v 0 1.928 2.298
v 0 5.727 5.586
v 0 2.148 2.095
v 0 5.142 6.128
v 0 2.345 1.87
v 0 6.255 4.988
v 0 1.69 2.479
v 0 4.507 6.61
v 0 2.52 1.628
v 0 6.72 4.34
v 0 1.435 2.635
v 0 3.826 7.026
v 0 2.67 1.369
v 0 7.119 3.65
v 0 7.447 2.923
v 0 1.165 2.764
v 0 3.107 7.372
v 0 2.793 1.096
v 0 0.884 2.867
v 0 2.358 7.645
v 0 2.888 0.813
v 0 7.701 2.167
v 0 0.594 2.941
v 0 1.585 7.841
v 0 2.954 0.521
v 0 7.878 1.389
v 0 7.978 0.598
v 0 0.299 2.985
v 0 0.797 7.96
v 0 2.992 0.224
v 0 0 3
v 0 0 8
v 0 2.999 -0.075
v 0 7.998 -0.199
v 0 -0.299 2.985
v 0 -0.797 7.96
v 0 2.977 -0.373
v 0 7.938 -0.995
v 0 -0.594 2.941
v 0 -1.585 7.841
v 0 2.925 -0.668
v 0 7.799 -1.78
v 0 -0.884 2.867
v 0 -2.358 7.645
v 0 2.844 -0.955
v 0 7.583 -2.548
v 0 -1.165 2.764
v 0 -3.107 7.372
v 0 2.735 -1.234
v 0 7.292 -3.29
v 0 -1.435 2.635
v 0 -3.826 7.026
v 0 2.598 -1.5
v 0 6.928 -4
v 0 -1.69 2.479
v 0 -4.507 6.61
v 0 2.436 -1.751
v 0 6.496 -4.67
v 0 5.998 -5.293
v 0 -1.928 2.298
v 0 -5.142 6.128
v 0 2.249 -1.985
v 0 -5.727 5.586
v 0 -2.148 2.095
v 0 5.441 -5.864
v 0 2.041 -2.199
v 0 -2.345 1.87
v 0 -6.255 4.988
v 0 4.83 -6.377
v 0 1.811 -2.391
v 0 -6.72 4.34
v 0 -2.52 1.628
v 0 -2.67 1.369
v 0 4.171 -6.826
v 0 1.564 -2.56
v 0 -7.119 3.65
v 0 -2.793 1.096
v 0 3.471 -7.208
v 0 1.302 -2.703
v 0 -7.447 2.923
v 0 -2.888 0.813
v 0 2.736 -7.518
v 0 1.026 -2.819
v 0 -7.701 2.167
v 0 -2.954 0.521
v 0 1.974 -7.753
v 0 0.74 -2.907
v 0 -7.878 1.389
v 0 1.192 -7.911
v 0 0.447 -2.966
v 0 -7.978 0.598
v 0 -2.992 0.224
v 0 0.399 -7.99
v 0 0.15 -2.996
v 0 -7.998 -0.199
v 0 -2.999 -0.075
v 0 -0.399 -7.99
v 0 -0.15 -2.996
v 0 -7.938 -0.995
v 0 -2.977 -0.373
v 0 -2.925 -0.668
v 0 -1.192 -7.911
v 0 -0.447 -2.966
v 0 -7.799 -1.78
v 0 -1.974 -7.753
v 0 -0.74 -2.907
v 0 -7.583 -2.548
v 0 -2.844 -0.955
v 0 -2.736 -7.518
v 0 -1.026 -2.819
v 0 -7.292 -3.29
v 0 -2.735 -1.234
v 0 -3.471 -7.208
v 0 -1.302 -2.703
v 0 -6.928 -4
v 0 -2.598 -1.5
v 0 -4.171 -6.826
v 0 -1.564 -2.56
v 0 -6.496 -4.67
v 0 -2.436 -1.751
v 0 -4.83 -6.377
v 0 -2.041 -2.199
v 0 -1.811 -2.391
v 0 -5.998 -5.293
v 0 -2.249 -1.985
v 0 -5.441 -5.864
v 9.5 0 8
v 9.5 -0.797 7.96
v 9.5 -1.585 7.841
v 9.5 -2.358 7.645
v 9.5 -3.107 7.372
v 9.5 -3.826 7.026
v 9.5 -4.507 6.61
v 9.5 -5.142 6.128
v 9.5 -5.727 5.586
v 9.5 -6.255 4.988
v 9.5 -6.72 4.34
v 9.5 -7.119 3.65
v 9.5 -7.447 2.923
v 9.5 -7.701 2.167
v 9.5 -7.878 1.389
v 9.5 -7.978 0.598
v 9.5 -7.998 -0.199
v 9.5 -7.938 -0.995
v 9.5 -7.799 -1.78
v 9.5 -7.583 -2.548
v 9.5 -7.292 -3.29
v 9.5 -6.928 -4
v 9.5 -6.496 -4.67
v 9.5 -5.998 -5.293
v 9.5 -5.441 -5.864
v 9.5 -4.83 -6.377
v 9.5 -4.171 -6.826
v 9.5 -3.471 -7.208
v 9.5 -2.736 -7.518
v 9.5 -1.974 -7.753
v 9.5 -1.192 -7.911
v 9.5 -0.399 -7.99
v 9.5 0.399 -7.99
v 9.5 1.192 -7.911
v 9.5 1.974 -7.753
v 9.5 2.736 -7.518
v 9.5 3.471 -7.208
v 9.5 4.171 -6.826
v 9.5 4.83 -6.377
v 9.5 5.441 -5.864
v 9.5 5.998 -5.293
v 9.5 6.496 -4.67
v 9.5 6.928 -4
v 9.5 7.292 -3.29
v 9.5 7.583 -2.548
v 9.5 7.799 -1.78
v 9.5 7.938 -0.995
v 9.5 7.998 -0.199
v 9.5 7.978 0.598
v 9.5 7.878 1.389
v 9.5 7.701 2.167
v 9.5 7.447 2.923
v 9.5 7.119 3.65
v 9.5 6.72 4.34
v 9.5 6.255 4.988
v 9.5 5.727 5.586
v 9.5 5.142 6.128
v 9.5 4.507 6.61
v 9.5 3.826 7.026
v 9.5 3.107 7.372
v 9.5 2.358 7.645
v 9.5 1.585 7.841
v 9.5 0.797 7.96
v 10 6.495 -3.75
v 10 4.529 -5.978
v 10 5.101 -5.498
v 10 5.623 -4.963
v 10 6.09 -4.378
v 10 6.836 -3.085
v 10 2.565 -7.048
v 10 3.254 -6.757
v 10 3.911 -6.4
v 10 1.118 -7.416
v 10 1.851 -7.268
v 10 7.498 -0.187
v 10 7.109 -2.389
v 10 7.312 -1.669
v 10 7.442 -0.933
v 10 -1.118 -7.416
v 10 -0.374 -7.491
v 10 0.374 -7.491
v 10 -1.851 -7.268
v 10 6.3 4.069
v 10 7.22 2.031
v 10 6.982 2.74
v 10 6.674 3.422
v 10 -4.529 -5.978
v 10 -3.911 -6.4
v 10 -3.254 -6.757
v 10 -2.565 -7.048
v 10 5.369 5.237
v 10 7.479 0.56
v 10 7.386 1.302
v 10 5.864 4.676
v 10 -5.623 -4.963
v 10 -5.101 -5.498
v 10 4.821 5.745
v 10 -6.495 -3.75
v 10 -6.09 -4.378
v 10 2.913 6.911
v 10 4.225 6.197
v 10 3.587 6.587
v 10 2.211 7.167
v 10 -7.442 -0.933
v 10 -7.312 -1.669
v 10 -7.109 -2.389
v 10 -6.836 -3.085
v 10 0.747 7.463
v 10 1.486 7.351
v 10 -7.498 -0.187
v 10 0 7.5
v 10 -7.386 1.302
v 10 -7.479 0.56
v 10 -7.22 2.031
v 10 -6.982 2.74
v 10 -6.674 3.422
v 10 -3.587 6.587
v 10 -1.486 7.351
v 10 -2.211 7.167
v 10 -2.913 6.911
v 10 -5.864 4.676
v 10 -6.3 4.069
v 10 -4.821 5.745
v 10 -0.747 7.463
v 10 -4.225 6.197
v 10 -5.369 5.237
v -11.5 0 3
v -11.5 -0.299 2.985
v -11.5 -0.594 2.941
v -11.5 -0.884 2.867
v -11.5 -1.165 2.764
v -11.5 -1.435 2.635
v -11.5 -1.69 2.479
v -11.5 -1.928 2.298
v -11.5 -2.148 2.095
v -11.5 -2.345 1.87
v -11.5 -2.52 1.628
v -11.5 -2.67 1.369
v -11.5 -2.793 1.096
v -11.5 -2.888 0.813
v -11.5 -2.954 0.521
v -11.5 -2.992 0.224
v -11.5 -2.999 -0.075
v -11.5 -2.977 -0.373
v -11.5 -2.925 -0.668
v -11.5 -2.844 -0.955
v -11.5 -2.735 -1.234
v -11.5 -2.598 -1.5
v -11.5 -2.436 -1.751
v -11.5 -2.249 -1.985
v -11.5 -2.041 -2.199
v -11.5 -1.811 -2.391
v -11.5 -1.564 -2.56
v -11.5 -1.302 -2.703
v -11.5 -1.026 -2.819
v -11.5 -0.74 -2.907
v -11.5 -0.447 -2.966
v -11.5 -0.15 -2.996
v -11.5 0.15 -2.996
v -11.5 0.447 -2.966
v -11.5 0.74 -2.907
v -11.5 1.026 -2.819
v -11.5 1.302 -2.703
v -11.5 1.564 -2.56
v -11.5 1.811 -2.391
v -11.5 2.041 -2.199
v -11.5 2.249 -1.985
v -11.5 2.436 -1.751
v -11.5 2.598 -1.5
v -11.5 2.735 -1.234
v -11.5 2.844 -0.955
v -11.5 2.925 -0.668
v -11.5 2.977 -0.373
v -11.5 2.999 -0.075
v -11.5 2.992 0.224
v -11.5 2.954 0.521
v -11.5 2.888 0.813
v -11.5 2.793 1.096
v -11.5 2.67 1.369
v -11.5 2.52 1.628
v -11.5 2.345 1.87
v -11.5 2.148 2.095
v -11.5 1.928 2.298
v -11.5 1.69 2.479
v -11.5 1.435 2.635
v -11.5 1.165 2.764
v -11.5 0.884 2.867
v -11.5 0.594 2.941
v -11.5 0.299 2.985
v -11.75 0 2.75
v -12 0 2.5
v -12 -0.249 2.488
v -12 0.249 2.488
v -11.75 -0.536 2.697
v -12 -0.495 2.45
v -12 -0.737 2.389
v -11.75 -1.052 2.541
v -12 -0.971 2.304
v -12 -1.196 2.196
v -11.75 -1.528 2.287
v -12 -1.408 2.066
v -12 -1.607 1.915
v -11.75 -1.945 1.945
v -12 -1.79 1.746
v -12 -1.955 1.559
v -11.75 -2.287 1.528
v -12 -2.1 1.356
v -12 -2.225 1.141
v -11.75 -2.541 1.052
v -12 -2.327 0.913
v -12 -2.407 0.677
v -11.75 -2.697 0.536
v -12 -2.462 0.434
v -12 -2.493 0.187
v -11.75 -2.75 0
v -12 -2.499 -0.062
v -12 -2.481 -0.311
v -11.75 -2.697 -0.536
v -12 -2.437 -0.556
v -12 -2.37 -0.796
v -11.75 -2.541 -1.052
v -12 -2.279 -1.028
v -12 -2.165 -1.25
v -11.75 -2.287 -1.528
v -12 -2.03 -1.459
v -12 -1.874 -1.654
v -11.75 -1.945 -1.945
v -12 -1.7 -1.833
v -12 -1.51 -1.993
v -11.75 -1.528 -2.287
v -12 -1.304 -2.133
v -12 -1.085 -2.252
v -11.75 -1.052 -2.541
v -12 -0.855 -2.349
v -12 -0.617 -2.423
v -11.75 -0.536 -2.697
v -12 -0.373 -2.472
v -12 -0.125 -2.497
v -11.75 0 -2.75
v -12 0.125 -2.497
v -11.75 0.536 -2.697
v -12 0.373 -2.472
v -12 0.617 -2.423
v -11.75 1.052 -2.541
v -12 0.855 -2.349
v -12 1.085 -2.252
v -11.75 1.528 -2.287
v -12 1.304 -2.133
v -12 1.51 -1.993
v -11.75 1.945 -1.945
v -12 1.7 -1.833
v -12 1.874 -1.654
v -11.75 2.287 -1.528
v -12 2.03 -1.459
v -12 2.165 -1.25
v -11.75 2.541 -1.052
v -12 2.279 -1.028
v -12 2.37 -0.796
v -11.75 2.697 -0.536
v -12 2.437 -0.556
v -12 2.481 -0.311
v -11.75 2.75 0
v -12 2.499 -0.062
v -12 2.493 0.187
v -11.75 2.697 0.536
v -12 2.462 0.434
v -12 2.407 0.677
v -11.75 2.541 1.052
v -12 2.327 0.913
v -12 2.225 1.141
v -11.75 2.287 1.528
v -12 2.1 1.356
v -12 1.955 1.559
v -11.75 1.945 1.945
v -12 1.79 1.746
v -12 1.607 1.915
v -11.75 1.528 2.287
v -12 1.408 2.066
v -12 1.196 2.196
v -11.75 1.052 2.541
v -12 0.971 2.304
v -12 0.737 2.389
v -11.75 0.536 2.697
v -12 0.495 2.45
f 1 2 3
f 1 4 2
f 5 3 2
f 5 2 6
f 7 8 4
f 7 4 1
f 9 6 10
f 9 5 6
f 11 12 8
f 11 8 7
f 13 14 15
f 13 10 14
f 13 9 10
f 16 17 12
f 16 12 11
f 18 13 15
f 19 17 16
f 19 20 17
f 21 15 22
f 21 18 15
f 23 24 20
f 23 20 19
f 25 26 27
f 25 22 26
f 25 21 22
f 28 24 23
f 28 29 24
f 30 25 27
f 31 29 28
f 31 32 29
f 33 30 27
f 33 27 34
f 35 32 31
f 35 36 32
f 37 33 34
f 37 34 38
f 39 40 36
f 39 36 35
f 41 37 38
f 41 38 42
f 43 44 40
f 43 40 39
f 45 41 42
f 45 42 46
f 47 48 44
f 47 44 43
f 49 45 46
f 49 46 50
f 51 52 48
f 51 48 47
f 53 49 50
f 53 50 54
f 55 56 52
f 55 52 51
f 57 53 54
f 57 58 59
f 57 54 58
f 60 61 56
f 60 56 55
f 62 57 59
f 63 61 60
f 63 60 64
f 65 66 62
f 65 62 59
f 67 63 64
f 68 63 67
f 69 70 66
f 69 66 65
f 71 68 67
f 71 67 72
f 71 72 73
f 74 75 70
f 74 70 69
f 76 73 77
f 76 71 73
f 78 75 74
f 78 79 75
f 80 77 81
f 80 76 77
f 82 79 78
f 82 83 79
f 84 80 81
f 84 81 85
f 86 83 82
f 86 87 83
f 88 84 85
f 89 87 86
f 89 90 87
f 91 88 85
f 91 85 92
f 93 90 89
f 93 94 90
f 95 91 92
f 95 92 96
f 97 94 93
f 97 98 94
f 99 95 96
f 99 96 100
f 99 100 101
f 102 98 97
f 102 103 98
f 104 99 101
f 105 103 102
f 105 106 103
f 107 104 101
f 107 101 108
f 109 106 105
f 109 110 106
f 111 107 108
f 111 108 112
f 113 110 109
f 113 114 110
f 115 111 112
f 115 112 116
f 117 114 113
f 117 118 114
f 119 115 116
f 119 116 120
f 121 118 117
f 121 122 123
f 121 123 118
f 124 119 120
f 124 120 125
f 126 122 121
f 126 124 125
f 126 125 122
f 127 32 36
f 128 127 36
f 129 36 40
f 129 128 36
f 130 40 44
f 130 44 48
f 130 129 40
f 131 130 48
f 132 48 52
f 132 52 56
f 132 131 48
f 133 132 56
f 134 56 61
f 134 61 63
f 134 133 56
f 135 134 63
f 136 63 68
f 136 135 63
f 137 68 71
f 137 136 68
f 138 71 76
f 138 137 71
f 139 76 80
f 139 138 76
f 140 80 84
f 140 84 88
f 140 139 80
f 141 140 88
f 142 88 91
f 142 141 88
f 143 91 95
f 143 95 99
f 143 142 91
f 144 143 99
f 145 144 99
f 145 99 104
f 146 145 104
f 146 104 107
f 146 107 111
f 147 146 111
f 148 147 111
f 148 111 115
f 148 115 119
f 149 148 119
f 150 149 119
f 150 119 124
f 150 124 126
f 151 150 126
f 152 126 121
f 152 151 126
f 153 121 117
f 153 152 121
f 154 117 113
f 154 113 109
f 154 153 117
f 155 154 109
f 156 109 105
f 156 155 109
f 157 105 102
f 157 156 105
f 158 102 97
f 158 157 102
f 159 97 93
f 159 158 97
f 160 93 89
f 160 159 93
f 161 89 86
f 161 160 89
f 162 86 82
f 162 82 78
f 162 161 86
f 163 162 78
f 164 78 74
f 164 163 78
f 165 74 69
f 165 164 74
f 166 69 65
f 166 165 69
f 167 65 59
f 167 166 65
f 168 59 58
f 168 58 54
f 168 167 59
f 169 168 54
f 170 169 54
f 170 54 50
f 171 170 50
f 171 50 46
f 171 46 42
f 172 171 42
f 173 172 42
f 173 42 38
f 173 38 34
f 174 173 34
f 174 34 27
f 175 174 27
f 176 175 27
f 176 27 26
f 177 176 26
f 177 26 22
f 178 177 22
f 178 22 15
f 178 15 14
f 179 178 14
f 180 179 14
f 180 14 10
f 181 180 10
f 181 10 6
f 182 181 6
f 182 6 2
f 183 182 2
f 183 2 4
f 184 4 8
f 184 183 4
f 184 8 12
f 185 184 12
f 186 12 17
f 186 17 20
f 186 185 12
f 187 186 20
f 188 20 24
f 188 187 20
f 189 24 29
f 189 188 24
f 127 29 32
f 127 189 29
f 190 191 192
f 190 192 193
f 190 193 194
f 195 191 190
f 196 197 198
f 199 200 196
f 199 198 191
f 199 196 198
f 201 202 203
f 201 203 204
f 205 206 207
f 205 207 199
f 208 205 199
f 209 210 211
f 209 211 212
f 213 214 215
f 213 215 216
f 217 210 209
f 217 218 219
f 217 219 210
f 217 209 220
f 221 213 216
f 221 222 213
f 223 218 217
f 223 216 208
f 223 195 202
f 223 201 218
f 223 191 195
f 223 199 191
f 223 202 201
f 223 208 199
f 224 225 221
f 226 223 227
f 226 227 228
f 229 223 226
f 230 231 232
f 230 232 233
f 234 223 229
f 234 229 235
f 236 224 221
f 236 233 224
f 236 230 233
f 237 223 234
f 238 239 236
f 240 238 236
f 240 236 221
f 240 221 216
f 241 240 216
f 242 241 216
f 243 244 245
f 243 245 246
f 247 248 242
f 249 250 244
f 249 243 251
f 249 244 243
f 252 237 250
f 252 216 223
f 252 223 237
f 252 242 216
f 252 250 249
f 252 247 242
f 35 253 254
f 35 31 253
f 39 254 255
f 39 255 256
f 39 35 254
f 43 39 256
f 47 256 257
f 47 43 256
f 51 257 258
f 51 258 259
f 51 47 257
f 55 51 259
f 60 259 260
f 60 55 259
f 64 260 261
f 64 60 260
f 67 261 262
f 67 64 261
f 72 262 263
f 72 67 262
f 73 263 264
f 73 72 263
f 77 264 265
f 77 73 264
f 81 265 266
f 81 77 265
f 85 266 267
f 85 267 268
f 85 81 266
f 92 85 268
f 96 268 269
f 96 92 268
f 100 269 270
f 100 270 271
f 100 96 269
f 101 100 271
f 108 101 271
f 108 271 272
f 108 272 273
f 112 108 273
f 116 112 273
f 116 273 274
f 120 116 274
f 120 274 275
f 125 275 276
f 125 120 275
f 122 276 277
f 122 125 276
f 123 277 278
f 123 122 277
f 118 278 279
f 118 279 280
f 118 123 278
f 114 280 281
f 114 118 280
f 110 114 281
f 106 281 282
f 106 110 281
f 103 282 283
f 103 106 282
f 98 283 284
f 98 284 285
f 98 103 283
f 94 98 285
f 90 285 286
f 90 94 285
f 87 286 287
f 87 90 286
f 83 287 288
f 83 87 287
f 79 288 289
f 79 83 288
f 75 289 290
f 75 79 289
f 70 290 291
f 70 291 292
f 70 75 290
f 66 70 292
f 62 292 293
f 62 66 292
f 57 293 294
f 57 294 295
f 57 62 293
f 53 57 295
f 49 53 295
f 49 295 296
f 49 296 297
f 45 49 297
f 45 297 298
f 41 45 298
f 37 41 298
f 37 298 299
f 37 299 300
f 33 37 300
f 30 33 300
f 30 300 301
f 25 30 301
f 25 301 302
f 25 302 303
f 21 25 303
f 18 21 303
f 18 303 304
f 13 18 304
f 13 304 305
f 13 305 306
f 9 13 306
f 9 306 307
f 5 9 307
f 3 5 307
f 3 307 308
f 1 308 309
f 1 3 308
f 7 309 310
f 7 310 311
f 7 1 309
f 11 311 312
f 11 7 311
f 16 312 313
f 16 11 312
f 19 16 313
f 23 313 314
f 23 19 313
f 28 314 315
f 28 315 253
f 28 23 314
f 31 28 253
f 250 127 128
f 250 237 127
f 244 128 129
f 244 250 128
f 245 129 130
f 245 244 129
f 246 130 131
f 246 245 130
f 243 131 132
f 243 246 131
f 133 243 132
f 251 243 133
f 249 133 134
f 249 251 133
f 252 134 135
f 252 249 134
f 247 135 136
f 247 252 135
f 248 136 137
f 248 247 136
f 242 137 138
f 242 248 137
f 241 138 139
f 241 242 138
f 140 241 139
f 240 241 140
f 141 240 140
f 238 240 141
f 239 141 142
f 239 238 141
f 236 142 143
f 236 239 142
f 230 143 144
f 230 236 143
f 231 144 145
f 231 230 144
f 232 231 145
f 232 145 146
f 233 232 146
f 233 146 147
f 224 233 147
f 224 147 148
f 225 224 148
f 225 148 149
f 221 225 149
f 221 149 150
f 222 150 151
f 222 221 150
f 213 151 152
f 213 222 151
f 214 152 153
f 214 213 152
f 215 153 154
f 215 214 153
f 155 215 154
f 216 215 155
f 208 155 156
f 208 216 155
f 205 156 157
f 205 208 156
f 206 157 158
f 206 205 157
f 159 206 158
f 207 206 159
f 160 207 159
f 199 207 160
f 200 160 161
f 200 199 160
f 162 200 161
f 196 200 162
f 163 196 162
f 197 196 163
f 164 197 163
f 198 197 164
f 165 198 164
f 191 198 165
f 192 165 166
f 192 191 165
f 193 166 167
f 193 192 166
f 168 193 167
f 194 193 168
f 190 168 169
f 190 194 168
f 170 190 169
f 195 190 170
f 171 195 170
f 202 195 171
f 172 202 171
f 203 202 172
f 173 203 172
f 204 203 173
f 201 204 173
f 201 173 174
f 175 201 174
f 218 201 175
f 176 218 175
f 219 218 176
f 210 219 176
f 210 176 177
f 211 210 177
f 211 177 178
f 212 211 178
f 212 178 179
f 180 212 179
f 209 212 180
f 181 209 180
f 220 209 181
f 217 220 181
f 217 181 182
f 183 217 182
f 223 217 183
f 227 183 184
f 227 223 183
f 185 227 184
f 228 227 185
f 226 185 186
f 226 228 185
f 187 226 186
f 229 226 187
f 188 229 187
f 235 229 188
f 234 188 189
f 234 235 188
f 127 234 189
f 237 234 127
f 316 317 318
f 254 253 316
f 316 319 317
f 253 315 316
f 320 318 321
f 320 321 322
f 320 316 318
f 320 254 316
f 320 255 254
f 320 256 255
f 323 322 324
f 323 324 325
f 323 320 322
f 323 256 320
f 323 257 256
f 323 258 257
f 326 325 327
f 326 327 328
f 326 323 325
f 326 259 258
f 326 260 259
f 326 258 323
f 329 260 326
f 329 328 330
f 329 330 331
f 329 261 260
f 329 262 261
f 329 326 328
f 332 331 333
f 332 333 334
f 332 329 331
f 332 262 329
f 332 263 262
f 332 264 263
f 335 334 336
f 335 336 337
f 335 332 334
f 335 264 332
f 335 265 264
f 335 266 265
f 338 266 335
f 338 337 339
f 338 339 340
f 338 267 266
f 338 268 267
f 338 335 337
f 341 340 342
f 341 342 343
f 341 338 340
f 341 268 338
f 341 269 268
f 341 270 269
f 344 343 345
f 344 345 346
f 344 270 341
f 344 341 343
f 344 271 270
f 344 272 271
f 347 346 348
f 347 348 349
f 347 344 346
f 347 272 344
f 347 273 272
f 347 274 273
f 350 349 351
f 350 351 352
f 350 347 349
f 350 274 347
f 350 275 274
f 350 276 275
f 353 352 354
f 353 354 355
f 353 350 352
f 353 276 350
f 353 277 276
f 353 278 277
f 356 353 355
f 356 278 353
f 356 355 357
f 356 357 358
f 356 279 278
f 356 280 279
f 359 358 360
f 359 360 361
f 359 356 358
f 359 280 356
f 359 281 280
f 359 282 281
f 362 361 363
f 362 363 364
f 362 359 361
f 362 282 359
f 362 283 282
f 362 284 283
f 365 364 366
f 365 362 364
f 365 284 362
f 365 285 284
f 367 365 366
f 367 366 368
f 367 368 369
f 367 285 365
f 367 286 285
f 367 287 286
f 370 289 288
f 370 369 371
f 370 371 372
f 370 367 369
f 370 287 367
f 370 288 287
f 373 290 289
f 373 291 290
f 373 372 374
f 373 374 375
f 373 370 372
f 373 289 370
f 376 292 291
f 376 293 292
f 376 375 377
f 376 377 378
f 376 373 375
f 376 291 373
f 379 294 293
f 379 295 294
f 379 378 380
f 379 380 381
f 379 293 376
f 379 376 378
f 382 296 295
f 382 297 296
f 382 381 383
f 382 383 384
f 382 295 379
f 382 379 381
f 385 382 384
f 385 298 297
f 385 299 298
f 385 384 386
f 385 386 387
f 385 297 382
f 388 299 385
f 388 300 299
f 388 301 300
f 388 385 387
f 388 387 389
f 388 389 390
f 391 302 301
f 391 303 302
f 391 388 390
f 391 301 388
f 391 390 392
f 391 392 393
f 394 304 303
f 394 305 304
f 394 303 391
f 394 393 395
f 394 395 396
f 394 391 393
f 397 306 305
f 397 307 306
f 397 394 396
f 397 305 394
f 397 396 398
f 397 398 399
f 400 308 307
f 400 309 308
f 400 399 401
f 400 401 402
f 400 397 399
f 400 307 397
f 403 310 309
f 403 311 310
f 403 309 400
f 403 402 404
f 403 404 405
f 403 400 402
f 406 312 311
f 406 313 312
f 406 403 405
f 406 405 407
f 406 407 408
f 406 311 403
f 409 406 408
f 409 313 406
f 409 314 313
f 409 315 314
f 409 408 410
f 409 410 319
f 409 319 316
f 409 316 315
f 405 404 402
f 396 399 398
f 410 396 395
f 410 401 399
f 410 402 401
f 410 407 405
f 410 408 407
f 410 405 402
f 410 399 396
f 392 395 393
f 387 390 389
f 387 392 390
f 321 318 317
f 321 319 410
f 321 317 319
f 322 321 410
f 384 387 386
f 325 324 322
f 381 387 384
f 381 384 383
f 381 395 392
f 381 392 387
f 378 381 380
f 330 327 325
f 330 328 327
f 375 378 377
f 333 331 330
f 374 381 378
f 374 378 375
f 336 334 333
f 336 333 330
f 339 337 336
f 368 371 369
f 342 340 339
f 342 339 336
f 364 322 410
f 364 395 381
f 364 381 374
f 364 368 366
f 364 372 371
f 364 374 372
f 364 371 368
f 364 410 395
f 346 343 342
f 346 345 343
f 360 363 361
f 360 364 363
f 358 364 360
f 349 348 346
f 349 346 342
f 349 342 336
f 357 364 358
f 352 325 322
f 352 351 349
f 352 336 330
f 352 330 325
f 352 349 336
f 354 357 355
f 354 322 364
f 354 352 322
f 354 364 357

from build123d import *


with BuildPart() as part:
    # Sketch_Tip_Profile → Tip_Revolve_D16x10_Stud_M6x12 (revolve)
    with BuildSketch(Plane.XY):
        Polygon((-12, 0), (-12, 2.5), (-11.5, 3), (0, 3), (0, 8), (9.5, 8), (10, 7.5), (10, 0), align=None)
    revolve(axis=Axis((-15, 0, 0), (1, 0, 0)))


solid = part.part
